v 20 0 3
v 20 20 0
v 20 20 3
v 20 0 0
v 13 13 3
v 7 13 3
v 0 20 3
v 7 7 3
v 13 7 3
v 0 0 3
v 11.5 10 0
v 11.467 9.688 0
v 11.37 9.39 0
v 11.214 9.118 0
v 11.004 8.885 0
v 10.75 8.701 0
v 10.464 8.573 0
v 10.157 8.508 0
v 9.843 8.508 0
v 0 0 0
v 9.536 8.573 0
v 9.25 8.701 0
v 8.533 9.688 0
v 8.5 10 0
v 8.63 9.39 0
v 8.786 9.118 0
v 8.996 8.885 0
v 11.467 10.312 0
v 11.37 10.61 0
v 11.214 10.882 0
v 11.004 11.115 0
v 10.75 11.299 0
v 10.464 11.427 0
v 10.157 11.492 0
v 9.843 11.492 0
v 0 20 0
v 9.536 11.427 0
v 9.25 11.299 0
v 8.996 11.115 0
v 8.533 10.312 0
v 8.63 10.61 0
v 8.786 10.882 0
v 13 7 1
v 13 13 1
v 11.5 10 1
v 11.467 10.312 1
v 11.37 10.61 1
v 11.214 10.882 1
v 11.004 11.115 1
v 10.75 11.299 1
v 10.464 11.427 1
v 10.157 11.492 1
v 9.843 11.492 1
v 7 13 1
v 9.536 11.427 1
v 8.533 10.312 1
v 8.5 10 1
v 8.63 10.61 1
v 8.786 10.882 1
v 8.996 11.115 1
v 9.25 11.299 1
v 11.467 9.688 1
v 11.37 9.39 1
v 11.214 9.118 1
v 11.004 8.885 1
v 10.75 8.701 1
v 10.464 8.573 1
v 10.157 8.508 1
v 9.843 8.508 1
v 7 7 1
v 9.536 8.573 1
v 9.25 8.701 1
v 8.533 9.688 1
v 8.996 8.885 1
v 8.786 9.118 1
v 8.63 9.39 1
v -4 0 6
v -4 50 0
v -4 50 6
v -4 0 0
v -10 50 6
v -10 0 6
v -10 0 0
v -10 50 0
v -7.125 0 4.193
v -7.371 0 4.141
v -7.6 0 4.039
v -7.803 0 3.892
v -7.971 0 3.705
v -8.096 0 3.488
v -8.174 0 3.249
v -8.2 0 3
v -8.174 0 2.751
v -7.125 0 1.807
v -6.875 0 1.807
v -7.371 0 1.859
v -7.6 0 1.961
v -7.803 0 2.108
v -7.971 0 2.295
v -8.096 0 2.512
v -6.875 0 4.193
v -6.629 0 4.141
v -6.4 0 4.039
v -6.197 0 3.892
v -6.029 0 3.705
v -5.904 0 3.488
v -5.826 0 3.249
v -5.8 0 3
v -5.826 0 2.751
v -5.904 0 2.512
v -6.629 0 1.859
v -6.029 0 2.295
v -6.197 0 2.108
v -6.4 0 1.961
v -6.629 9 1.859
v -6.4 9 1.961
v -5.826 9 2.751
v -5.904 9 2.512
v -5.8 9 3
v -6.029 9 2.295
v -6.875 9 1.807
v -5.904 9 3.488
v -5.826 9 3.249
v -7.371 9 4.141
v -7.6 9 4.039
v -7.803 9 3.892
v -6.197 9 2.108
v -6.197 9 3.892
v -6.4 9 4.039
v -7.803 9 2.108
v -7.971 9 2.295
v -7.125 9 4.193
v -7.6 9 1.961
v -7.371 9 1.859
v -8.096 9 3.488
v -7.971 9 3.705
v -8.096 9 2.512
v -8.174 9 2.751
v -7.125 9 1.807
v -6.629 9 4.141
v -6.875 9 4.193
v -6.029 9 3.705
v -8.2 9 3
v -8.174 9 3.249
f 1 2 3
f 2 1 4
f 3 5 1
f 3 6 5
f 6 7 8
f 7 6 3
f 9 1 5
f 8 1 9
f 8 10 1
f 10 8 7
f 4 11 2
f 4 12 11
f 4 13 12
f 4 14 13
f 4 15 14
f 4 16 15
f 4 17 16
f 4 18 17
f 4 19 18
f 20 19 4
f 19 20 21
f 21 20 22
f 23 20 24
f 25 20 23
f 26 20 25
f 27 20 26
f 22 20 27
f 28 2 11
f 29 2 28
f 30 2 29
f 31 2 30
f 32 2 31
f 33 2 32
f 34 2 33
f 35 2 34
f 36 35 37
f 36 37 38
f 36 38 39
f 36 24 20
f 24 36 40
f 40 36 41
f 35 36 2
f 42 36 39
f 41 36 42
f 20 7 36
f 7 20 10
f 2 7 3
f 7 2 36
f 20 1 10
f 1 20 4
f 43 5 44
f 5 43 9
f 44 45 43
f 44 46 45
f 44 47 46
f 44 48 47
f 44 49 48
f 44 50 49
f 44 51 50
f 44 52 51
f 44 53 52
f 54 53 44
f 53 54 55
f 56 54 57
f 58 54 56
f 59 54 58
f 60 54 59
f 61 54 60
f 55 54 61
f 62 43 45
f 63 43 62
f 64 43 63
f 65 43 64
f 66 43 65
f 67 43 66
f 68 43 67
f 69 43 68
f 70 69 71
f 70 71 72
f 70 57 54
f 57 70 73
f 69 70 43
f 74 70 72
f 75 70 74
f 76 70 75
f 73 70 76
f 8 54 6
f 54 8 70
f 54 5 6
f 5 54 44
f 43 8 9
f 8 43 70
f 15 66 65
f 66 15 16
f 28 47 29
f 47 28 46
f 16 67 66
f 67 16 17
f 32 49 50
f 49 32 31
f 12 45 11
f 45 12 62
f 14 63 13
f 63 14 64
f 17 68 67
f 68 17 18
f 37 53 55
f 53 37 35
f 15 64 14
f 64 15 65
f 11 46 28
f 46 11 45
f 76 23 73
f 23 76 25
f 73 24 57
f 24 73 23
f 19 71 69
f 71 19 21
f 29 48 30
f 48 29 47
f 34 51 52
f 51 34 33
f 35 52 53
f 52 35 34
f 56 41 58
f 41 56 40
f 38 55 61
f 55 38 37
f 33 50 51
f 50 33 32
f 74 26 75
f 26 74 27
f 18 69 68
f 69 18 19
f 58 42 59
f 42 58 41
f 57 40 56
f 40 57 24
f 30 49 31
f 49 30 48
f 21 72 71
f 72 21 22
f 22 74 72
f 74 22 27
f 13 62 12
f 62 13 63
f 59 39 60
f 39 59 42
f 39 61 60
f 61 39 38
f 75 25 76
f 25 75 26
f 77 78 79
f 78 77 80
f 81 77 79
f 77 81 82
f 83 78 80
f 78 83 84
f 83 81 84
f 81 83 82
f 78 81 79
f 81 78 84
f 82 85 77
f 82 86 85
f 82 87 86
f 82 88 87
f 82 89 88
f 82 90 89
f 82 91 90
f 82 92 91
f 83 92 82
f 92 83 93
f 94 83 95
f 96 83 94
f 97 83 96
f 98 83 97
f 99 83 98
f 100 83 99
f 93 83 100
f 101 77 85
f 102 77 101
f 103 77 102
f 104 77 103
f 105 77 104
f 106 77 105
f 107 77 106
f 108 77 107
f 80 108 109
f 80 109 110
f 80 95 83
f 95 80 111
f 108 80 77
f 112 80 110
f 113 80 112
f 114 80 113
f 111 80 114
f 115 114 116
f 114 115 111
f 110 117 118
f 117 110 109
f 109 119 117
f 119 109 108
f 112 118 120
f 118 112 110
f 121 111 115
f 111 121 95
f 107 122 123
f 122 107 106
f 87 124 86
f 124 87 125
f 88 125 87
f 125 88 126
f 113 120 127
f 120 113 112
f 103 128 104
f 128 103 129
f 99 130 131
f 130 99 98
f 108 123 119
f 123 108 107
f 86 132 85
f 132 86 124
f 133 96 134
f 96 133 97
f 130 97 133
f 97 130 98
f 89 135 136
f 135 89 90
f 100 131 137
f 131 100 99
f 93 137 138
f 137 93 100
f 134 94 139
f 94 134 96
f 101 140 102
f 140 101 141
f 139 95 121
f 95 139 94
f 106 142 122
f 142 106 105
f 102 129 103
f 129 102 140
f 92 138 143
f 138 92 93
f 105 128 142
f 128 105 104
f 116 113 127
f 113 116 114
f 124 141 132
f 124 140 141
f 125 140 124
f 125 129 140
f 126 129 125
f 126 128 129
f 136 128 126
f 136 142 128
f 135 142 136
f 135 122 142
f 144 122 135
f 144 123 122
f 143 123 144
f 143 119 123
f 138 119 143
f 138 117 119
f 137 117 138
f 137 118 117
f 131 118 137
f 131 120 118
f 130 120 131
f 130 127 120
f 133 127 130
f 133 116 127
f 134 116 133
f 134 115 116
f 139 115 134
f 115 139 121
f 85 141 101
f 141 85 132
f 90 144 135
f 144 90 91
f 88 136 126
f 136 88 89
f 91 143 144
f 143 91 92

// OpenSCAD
difference() {
  $fn=30;
  cube([20,20,3]);
  translate([7,7,1]) cube ([6,6,3]);
  translate([10,10,-1]) cylinder(d=3,h=5);
}

translate([-10,0,0]) difference() {
  $fn=30;
  cube ([6,50,6]);
  translate([3,-1,3]) rotate([-90,0,0]) cylinder(d=2.4, h=10);
}
